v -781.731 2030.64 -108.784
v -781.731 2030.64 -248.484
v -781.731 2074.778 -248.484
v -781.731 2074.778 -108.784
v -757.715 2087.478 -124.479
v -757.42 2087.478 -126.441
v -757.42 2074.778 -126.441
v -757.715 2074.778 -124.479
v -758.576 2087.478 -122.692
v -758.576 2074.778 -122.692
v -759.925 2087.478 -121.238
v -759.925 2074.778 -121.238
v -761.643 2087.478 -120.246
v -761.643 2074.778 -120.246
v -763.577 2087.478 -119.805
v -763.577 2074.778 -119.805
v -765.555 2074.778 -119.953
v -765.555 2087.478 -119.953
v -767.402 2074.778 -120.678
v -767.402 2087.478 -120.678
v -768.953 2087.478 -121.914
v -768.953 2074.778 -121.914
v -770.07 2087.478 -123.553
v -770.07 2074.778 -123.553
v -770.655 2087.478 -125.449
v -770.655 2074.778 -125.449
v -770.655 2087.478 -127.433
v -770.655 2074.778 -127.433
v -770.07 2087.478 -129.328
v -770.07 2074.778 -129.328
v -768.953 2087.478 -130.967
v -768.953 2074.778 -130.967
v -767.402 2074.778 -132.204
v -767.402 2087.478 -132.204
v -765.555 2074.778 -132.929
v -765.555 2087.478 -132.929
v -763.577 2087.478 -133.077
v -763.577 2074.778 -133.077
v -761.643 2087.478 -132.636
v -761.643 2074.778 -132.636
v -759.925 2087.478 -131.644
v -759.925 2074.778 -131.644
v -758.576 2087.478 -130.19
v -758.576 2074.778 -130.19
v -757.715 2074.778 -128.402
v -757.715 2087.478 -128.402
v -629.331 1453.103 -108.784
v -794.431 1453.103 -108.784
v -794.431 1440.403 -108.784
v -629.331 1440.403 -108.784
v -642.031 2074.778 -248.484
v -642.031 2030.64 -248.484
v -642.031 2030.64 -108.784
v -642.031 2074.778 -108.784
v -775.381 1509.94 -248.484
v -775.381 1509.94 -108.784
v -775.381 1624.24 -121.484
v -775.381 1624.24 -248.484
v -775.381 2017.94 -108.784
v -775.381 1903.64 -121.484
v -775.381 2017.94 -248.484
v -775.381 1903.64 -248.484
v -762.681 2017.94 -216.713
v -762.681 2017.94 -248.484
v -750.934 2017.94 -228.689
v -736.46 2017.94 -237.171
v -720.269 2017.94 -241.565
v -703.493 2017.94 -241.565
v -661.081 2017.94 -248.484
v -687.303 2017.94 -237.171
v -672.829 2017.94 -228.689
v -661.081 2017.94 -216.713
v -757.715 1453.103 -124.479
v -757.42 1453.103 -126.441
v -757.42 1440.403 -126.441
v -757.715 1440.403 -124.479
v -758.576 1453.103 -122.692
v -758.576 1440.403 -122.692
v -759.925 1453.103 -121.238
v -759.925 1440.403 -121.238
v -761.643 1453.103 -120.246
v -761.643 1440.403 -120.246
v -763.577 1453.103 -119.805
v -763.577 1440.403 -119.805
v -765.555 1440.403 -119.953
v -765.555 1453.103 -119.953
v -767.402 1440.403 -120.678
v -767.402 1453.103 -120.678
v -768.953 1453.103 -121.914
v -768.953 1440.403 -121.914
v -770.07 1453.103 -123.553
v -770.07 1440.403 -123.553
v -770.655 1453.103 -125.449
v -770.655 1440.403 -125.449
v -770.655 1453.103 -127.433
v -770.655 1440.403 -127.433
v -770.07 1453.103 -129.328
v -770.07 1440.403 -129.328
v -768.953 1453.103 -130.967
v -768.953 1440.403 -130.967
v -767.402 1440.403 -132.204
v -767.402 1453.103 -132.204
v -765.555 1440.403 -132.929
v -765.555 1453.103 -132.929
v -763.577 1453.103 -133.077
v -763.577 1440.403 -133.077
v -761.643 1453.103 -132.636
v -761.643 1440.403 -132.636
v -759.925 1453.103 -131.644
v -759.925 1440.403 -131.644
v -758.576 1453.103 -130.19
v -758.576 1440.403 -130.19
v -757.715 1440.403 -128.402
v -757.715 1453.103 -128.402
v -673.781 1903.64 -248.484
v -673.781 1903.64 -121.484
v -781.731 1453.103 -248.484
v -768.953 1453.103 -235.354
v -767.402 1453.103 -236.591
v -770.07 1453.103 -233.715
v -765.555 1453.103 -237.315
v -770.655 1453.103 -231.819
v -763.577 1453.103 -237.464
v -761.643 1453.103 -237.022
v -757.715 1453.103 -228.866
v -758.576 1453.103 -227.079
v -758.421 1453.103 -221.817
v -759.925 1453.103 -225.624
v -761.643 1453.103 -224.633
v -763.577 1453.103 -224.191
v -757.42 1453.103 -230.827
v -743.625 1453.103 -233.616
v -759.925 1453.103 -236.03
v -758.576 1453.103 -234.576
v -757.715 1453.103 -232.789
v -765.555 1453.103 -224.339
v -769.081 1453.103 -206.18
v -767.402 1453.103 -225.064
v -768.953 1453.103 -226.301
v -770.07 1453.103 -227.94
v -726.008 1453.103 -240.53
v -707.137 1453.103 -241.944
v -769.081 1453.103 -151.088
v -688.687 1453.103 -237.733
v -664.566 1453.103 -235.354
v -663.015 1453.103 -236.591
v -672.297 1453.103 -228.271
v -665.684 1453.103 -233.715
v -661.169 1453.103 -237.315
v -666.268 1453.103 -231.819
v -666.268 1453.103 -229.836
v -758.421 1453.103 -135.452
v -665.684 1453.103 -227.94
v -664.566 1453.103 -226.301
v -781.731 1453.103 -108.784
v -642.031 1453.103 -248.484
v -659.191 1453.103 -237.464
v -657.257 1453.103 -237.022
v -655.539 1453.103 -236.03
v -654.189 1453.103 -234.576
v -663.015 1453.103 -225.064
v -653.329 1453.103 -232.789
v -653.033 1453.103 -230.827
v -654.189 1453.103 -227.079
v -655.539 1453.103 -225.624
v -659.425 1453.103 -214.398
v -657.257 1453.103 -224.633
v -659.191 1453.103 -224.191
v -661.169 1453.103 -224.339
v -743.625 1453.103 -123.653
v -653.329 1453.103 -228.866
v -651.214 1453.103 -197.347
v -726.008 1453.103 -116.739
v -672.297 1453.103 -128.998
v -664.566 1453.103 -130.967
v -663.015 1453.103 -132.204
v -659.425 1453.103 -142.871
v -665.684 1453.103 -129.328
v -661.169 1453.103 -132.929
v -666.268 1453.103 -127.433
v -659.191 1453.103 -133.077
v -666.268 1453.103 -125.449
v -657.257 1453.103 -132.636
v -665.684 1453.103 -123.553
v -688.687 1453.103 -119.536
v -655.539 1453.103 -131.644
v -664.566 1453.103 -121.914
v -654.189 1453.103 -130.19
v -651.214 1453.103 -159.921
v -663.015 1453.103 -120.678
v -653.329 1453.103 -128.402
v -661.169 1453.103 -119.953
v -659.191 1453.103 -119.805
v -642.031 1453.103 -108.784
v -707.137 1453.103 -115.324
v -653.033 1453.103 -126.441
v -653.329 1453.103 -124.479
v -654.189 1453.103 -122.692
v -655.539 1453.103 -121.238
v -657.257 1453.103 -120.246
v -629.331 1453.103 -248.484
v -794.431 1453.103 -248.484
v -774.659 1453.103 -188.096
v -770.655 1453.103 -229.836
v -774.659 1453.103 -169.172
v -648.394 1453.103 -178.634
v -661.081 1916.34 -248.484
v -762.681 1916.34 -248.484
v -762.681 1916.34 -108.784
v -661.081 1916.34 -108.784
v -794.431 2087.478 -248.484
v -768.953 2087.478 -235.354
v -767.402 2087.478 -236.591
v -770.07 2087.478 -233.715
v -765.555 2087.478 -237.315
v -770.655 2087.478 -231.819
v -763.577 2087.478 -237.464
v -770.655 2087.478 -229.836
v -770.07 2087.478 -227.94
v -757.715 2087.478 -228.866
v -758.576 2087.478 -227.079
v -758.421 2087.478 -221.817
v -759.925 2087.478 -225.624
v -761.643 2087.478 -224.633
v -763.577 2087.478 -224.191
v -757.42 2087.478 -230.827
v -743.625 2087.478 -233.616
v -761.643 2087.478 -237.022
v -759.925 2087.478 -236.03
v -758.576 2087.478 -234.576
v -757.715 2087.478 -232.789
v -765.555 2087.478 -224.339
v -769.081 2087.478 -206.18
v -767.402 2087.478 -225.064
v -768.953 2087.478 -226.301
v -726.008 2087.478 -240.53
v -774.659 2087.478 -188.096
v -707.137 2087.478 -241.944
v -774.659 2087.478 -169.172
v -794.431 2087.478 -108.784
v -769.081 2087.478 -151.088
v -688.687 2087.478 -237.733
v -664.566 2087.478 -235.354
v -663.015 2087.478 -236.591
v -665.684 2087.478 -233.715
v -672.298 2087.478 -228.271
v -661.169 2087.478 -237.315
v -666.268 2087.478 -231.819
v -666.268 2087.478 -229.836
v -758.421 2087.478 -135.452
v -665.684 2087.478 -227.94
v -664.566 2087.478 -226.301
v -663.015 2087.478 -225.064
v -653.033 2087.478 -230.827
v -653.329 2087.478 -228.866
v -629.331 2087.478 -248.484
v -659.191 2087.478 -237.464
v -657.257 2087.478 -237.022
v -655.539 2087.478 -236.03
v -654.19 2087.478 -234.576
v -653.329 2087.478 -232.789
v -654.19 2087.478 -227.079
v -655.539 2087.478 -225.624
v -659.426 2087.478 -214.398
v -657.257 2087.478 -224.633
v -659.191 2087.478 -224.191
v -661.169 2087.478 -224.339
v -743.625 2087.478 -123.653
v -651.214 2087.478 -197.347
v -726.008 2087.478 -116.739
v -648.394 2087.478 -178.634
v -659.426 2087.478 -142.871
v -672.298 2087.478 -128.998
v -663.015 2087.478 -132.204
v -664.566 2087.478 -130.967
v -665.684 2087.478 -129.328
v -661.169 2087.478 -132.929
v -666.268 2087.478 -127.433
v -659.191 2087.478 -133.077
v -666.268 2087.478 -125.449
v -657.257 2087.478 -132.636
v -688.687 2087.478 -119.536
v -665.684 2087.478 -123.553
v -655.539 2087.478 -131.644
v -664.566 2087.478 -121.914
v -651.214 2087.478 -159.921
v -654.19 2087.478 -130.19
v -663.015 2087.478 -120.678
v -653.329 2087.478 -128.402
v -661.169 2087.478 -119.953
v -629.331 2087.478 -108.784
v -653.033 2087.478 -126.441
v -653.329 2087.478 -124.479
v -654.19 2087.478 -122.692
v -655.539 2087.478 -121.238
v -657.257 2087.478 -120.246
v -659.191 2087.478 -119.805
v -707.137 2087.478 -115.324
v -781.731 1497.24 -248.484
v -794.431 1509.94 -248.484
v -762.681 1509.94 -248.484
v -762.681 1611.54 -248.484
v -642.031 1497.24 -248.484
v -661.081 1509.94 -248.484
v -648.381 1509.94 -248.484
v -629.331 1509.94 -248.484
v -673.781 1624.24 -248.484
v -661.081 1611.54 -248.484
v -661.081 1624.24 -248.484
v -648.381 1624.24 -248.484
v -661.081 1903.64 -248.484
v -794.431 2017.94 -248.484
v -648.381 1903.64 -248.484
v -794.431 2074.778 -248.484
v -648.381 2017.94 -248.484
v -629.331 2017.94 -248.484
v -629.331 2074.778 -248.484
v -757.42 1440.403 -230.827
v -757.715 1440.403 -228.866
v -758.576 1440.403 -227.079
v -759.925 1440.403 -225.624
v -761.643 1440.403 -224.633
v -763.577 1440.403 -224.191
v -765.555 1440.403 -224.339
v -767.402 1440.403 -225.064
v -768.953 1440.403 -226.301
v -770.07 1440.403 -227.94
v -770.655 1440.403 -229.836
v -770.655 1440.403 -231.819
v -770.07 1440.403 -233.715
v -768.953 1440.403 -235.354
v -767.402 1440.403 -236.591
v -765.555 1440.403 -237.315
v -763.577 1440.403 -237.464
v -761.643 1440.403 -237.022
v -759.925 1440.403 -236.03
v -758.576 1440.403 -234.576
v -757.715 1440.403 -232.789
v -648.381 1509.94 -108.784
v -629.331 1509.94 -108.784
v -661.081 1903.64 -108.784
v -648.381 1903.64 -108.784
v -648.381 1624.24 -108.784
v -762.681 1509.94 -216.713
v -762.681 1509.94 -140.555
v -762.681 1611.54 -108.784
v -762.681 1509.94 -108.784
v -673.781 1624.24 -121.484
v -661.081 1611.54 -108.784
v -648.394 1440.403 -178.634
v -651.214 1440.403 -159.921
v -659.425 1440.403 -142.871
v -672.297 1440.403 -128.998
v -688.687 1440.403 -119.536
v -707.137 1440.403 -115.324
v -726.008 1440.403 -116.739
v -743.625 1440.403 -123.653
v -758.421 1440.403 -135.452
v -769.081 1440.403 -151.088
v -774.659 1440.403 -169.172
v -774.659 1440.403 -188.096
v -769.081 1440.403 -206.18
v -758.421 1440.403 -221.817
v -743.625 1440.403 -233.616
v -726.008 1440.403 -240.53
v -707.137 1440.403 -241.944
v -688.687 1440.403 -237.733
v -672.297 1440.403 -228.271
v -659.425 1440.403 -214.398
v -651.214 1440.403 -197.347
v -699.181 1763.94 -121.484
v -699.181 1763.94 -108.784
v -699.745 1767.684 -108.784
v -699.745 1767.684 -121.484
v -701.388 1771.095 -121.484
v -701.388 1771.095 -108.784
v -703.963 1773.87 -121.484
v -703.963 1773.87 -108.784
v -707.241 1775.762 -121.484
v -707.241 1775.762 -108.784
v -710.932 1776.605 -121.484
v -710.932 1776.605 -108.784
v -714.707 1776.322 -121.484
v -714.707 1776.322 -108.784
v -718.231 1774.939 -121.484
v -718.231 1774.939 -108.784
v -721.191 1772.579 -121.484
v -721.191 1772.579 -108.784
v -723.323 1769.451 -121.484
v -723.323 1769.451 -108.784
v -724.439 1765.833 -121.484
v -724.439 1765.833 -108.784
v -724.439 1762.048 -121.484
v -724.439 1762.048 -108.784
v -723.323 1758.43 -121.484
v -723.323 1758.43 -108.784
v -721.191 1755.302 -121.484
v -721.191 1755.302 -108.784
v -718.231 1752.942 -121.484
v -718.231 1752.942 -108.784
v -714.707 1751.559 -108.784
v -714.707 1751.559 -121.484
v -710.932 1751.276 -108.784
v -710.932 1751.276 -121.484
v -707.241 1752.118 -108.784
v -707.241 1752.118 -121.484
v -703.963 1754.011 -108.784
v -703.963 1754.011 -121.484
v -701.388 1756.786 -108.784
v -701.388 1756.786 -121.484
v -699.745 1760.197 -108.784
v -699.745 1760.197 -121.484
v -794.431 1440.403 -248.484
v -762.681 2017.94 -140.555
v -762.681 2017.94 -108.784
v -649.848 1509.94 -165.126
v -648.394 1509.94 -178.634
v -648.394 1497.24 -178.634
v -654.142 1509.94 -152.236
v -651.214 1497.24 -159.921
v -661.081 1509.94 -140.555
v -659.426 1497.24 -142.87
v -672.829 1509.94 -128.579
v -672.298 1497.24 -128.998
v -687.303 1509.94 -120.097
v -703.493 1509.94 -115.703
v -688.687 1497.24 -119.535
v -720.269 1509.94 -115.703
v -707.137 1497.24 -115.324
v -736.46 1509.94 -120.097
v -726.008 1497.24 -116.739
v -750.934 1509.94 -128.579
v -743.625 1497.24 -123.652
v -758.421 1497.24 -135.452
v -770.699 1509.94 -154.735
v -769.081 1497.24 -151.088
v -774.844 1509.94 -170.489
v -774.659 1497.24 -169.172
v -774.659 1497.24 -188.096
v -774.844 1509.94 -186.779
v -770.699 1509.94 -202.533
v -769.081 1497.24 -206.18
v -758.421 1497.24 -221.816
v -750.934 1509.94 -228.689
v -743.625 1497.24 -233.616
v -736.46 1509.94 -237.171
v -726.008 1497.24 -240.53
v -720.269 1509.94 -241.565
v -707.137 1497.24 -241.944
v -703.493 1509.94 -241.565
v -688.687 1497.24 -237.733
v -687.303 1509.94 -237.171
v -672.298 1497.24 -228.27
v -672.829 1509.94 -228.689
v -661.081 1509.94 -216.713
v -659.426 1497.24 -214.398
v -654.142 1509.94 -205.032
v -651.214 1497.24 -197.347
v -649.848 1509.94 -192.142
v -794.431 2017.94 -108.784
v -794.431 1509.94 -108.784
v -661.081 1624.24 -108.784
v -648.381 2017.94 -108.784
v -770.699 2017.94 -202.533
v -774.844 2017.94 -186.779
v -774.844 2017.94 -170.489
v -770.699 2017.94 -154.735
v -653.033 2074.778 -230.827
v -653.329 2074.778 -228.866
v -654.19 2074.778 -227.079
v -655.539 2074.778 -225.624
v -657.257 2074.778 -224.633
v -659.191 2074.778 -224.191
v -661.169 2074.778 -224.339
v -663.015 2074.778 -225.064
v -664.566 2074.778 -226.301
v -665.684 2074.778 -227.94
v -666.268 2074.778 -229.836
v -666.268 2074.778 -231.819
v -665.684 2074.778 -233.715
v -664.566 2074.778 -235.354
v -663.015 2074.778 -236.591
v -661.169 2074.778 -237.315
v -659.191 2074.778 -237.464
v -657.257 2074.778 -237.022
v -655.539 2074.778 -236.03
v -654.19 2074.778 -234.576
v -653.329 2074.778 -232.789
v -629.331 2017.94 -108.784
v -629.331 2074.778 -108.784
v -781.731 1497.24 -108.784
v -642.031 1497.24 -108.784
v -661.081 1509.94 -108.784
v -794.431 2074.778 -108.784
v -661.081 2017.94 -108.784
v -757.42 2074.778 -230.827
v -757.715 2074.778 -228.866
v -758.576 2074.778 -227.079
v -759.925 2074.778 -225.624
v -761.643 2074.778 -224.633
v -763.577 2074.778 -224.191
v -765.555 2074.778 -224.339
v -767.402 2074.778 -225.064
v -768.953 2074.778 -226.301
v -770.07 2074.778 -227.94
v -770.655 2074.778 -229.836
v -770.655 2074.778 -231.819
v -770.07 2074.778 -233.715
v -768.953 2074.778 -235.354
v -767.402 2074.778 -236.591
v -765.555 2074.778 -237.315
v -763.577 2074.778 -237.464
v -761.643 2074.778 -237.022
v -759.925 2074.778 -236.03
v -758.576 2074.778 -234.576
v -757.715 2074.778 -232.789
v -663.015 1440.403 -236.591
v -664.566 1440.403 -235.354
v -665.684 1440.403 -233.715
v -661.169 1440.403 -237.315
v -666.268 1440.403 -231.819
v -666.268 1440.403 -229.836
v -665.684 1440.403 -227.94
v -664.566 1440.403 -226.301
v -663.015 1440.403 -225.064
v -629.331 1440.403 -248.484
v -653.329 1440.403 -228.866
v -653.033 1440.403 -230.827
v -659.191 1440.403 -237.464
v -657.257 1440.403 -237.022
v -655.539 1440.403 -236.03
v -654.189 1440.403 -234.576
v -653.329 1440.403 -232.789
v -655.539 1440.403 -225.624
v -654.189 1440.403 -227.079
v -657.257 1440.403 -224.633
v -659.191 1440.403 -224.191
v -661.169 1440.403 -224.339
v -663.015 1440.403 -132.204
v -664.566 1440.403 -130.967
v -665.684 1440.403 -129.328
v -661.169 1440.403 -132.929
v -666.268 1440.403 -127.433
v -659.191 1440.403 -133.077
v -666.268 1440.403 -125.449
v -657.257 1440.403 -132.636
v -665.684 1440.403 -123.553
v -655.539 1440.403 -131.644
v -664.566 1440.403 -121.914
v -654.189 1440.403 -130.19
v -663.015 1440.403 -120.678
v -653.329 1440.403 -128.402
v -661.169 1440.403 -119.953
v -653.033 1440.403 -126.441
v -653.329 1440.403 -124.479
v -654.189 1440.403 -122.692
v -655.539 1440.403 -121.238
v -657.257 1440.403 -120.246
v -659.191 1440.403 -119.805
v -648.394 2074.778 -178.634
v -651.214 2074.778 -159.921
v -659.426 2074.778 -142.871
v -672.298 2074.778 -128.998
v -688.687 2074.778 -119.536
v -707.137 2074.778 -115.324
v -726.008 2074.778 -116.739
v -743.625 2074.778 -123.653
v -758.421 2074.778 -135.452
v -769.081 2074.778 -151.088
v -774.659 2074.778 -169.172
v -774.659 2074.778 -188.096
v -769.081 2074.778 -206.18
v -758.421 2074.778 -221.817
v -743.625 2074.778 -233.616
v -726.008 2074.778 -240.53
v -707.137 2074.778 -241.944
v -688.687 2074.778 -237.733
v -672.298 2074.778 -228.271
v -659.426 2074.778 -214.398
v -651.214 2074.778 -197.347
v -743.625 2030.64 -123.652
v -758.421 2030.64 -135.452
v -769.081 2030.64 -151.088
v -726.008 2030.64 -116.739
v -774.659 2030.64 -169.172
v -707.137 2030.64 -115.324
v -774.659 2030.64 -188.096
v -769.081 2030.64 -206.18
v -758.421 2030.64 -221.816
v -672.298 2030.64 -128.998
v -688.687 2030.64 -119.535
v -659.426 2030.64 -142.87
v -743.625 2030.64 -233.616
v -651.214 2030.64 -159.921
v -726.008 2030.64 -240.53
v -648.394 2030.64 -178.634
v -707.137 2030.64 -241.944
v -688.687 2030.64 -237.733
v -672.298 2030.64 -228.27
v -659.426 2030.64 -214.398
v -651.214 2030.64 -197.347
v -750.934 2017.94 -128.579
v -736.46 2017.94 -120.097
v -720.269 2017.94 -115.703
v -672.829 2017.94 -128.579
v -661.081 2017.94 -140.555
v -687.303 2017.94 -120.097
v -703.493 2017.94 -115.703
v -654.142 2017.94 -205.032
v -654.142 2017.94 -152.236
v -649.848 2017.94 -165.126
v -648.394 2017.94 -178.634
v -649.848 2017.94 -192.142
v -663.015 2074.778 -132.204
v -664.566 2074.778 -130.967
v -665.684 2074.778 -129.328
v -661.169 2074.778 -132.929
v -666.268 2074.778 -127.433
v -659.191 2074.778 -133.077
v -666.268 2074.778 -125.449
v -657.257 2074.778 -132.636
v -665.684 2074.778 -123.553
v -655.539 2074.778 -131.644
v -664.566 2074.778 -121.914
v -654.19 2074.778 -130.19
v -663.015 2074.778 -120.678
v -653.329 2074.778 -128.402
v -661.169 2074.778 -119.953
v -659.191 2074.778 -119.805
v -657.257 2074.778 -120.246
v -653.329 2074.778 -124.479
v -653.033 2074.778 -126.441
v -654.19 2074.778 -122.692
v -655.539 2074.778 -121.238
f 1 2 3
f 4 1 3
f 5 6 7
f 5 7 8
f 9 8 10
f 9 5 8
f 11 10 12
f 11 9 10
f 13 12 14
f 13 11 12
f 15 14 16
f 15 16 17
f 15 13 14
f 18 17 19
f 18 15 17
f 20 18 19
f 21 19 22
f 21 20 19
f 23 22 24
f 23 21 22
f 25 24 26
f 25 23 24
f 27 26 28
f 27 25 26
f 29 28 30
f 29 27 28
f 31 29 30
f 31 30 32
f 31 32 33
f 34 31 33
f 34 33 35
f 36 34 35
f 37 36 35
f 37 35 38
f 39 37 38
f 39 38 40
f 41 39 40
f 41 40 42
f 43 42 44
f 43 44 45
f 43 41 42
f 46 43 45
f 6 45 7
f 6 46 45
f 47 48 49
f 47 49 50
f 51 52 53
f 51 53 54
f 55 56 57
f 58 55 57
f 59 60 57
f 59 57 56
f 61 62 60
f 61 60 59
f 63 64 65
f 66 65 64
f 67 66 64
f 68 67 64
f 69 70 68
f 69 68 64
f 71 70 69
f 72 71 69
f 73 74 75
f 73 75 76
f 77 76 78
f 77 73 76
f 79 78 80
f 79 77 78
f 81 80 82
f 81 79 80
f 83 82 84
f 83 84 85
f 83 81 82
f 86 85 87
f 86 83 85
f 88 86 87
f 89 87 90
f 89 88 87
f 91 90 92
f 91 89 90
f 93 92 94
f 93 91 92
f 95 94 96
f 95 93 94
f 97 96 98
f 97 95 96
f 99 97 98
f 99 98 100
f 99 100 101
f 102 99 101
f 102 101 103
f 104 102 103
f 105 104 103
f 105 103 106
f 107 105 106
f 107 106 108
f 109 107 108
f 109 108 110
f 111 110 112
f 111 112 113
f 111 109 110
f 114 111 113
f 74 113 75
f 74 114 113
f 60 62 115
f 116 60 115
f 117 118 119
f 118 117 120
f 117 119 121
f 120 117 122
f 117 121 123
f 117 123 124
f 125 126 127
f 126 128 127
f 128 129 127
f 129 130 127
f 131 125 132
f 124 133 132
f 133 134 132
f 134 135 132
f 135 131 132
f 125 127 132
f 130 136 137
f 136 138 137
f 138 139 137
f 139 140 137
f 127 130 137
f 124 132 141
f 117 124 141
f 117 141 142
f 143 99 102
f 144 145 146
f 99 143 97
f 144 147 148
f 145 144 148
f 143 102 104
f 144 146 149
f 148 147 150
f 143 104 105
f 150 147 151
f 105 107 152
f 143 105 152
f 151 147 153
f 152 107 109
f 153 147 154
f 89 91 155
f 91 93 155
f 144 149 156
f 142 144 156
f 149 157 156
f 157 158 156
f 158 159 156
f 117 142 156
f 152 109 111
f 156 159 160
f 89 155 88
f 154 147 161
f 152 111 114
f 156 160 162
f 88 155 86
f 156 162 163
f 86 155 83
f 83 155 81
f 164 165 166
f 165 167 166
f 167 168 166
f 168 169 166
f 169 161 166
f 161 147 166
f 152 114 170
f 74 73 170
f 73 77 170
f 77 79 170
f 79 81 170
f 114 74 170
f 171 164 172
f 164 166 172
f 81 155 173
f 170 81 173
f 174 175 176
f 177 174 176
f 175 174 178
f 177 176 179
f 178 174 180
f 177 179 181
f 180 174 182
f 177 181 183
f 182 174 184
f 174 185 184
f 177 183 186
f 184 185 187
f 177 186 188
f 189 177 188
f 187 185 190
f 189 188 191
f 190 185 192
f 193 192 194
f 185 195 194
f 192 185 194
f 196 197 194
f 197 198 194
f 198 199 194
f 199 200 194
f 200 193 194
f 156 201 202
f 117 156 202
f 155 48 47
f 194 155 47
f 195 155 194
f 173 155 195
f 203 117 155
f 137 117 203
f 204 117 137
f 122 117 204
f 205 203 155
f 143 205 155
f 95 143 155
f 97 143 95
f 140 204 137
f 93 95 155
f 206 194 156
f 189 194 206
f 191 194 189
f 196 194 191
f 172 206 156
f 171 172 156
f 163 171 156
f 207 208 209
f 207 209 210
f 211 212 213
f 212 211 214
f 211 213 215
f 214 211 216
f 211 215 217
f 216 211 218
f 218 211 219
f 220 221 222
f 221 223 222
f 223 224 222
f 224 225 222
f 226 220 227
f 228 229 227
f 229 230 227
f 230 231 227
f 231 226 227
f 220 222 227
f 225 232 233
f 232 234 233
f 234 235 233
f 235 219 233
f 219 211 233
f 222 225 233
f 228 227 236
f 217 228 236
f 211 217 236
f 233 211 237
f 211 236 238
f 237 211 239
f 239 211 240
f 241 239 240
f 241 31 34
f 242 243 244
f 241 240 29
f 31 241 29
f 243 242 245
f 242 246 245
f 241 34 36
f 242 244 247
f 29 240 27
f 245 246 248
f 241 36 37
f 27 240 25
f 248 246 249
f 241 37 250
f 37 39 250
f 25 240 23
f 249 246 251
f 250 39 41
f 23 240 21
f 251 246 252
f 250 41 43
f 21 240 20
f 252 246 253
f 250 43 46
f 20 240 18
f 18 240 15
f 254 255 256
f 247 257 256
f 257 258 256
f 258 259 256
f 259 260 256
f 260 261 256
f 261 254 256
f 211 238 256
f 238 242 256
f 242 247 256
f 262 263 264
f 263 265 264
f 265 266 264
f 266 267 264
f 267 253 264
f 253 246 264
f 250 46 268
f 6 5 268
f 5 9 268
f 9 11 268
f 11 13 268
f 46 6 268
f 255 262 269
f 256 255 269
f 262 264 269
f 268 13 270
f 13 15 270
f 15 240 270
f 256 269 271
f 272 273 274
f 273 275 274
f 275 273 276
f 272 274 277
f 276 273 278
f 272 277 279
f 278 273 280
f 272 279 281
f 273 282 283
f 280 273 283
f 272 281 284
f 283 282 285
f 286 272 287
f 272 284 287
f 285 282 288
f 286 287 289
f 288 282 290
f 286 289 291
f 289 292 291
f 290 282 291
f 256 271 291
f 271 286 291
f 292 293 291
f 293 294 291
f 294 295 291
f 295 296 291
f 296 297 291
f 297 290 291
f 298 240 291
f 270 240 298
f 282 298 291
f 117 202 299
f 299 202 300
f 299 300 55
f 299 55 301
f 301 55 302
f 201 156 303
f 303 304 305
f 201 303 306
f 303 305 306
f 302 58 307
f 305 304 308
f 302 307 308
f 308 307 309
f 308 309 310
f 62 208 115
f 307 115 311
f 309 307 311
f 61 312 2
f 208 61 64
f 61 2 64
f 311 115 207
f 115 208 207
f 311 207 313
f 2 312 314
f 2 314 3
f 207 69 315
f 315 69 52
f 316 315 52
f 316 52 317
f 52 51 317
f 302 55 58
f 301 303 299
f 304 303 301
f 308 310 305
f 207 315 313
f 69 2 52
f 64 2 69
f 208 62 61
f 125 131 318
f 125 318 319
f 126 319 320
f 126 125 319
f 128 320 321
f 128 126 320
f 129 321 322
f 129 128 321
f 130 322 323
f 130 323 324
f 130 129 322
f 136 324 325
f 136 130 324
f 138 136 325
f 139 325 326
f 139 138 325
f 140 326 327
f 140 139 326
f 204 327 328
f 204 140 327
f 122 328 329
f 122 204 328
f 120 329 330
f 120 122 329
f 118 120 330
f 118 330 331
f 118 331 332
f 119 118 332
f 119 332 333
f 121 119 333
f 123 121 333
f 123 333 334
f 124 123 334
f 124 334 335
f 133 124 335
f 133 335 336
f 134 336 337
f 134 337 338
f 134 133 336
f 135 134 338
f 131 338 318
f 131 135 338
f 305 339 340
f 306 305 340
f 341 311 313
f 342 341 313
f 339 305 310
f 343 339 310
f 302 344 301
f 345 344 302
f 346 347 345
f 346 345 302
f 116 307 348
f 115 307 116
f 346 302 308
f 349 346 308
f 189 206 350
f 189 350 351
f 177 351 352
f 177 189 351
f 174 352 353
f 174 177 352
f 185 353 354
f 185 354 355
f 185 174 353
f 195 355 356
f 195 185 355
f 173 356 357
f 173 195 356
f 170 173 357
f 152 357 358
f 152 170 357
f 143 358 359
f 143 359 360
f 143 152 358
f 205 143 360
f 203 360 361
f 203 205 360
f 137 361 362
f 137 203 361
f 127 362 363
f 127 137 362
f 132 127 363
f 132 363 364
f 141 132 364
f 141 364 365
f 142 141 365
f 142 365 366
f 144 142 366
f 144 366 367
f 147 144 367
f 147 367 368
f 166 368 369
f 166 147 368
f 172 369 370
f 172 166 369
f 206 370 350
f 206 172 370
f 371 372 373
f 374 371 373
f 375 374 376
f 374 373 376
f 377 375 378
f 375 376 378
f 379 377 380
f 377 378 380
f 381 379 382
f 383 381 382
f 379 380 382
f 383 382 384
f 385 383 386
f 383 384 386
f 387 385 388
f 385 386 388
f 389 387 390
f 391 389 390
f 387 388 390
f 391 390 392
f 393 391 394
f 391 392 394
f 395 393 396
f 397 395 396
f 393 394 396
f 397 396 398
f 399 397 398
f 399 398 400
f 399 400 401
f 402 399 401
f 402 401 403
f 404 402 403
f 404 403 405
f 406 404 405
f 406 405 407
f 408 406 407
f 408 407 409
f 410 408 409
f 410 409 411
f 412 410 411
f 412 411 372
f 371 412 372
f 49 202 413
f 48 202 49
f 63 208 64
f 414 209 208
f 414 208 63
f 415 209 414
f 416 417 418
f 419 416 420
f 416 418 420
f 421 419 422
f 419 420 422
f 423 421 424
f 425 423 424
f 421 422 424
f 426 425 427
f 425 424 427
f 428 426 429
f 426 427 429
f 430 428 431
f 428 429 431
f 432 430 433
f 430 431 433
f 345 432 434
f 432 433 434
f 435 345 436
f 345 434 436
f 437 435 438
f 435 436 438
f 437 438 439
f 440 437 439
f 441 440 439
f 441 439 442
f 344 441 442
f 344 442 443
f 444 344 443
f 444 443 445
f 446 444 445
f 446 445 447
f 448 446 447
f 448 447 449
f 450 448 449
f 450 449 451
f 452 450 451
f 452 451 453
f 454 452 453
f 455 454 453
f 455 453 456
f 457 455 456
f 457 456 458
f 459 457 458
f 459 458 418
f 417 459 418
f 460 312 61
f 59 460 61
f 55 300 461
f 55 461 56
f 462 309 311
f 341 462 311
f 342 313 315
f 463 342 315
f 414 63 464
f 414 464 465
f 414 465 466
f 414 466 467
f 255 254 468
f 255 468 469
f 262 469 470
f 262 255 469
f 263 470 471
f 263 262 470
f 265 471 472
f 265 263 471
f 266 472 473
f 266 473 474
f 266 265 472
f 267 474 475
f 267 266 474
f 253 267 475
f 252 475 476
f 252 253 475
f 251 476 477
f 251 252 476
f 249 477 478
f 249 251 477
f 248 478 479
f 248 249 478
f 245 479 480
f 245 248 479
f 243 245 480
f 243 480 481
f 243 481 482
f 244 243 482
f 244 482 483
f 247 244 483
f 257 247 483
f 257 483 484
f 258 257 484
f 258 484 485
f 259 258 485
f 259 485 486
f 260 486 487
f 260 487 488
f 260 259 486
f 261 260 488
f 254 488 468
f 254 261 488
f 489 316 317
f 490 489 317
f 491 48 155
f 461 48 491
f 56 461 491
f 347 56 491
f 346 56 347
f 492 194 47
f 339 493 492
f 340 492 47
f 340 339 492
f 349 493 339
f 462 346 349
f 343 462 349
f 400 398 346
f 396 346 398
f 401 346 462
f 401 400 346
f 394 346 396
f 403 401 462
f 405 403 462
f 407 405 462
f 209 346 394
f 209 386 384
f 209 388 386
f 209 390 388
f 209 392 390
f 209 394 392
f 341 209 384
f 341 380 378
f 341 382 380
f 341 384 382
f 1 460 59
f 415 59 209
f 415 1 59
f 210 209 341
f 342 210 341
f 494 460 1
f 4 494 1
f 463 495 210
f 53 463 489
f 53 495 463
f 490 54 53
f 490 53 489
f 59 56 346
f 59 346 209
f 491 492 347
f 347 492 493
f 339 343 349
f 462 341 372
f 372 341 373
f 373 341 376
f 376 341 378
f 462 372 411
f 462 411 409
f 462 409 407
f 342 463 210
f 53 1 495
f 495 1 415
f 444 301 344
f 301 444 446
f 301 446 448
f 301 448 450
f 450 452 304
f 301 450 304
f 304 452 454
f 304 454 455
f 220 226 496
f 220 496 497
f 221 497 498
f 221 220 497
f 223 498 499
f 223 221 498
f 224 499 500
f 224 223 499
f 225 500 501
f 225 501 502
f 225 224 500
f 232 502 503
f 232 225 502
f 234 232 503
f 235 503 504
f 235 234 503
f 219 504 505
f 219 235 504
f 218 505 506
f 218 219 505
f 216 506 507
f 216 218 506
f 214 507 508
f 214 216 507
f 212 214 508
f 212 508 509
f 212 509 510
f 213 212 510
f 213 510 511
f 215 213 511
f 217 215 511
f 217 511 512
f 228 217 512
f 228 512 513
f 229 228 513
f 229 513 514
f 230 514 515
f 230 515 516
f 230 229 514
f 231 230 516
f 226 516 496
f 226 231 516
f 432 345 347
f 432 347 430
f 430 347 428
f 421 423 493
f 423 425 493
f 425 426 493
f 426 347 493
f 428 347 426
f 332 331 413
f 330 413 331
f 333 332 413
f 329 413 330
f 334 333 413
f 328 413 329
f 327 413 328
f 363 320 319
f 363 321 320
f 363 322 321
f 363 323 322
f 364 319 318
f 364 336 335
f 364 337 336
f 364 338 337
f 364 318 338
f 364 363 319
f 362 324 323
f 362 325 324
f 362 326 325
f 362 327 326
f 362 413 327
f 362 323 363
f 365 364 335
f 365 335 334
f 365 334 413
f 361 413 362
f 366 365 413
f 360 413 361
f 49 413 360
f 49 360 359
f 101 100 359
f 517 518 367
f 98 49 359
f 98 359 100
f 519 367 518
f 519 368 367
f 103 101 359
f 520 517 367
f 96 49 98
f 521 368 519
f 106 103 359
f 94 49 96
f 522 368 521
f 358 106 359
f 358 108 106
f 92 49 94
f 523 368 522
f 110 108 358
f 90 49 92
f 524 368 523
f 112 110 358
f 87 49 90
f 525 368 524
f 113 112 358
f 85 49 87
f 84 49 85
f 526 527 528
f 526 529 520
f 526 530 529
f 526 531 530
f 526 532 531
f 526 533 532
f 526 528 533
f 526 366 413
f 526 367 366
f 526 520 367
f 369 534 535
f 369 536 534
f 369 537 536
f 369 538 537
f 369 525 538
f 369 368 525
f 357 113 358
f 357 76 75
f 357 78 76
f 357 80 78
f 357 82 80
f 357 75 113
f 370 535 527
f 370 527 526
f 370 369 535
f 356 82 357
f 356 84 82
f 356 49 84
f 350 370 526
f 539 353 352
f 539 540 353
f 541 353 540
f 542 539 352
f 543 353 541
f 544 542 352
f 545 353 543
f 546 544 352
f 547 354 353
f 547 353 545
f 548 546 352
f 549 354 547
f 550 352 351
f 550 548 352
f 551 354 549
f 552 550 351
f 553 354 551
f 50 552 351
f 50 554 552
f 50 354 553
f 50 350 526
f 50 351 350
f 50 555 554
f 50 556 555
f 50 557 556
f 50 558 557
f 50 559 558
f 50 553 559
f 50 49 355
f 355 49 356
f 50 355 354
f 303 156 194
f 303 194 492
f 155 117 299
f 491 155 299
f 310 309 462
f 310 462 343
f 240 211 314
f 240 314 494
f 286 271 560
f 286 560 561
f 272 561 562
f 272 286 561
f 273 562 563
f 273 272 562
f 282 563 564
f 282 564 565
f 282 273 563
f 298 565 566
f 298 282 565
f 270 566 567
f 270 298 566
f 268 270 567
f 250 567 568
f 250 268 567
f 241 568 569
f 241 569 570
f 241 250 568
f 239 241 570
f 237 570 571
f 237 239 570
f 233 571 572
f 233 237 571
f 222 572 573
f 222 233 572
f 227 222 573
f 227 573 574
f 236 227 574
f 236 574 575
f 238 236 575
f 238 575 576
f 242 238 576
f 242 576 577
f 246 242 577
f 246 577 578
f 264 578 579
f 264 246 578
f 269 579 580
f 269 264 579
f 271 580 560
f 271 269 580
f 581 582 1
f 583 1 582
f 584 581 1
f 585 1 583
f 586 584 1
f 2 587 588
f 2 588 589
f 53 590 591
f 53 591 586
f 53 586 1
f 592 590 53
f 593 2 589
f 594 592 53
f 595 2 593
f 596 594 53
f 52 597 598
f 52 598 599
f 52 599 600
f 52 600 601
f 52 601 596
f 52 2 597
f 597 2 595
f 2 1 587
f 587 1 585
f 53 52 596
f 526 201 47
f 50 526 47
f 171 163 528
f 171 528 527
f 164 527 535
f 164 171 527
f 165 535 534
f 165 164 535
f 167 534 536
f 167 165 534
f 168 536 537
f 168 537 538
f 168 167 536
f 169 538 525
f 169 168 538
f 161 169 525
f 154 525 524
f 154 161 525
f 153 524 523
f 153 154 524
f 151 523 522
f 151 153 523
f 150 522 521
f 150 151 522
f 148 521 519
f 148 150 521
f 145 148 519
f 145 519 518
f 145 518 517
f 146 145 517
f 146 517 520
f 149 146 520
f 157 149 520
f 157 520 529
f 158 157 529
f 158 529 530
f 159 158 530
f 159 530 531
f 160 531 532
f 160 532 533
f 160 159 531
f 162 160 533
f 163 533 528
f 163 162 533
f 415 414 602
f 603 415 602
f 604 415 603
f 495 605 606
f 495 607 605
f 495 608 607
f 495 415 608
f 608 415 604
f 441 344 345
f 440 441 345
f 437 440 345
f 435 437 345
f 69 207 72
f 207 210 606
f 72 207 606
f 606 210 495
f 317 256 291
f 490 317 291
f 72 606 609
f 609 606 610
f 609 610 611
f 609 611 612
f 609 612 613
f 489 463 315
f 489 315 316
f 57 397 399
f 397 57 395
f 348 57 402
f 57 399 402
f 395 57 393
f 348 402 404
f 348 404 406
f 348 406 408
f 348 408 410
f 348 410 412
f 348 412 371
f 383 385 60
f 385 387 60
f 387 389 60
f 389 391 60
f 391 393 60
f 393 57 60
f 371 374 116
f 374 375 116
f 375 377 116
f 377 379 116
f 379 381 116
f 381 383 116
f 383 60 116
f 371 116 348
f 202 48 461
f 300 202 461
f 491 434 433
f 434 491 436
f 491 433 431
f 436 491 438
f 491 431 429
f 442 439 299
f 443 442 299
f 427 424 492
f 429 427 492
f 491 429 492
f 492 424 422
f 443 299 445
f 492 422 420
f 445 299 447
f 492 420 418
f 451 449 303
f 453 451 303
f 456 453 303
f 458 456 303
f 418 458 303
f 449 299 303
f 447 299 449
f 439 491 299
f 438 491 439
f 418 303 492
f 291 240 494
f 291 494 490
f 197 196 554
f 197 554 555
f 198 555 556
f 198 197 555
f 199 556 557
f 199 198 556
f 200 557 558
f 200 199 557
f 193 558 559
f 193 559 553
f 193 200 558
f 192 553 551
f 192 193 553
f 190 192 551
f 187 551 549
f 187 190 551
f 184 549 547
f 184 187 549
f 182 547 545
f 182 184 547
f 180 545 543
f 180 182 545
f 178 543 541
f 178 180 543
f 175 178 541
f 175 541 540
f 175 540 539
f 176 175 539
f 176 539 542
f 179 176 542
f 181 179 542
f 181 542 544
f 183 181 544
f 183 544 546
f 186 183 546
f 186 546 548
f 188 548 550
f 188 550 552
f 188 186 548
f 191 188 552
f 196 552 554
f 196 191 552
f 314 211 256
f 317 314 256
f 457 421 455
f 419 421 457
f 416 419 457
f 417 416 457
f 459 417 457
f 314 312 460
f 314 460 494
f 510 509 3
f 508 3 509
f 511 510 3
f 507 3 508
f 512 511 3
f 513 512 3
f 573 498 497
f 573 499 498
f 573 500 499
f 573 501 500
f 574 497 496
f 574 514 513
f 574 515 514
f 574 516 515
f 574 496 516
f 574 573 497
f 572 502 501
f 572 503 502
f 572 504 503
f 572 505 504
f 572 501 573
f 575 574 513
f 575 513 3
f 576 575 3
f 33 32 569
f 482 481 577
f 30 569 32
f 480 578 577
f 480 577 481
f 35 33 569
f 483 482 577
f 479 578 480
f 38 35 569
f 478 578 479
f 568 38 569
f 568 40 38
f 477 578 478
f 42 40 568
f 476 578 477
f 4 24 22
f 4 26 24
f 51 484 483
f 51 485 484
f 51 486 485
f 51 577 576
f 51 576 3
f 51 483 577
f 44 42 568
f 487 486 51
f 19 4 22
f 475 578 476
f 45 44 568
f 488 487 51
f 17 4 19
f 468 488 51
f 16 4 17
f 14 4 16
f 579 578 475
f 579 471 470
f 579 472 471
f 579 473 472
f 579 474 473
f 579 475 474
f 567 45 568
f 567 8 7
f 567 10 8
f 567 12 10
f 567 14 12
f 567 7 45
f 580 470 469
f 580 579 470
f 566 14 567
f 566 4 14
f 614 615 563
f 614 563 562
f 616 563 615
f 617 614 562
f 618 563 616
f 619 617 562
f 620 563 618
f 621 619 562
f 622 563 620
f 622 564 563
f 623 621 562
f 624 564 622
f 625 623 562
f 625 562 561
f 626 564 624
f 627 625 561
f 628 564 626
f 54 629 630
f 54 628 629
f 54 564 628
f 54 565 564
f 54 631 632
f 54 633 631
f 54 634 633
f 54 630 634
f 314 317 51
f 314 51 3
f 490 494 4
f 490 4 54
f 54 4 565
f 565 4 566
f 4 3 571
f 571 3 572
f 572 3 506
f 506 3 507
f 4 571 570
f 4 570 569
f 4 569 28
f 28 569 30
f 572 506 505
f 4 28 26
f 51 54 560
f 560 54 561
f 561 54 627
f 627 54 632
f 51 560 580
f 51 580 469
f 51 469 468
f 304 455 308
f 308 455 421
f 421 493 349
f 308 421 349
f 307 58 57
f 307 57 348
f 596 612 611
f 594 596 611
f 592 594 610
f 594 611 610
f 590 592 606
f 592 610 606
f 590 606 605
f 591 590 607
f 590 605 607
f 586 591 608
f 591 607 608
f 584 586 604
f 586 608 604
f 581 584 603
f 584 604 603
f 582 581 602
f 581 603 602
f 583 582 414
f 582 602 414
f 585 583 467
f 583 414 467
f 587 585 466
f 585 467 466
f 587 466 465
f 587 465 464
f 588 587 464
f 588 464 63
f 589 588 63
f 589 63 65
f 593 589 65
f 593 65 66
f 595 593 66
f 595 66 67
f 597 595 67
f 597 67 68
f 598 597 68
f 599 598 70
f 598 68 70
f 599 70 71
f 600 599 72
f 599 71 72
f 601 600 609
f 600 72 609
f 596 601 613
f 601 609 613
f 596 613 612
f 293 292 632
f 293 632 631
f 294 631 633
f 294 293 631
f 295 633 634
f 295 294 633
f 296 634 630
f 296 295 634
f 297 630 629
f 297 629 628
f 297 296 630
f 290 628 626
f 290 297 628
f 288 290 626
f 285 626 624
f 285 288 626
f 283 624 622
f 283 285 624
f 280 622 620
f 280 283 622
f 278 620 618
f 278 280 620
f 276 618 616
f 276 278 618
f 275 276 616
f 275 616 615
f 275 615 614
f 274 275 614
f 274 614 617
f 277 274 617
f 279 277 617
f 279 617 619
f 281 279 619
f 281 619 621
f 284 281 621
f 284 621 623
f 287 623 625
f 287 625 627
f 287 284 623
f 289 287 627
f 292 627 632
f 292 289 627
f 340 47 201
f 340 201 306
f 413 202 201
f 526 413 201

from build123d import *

# Parameters (mm, degrees)
BOX003_W                 = 101.6
BOX003_H                 = 279.4
BOX003_DEPTH             = 12.7
BOX009_W                 = 12.7
BOX009_H                 = 44.1376
BOX009_DEPTH             = 139.7
BOX006_W                 = 12.7
BOX006_H                 = 44.1376
BOX006_DEPTH             = 139.7
BOX007_W                 = 12.7
BOX007_H                 = 44.1376
BOX007_DEPTH             = 139.7
SKETCH002_W              = 165.100117
SKETCH002_H              = 139.700117
SKETCH002_R              = 6.6548
SKETCH002_R_2            = 63.4873
PAD_DEPTH                = 12.7
CLONE001_PLACEMENT_ANGLE = 180
CLONE_PLACEMENT_ANGLE    = 180
BOX010_W                 = 165.1
BOX010_H                 = 12.7
BOX010_DEPTH             = 139.7
SKETCH004_R              = 63.4873
POCKET_DEPTH             = 12.7
BOX008_W                 = 12.7
BOX008_H                 = 44.1376
BOX008_DEPTH             = 139.7
BOX_W                    = 127
BOX_H                    = 114.3
BOX_DEPTH                = 139.7
BOX002_W                 = 12.7
BOX002_H                 = 279.4
BOX002_DEPTH             = 139.7
SKETCH003_R              = 12.7
SKETCH003_W              = 101.6
SKETCH003_H              = 101.6
POCKET003005_DEPTH       = 139.7


with BuildPart() as cube003:
    # Box003 → Box003 (new body)
    with BuildSketch(Plane(origin=(-224.636743, 494.971814, 58.555664), x_dir=(1, 0, 0), z_dir=(0, 0, 1))):
        with Locations((50.8, 139.7)):
            Rectangle(BOX003_W, BOX003_H)
    extrude(amount=BOX003_DEPTH)


with BuildPart() as cube009:
    # Box009 → Box009 (new body)
    with BuildSketch(Plane(origin=(-91.286743, 901.371814, -68.444336), x_dir=(1, 0, 0), z_dir=(0, 0, 1))):
        with Locations((6.35, 22.0688)):
            Rectangle(BOX009_W, BOX009_H)
    extrude(amount=BOX009_DEPTH)


with BuildPart() as cube006:
    # Box006 → Box006 (new body)
    with BuildSketch(Plane(origin=(-243.686743, 323.834214, -68.444336), x_dir=(1, 0, 0), z_dir=(0, 0, 1))):
        with Locations((6.35, 22.0688)):
            Rectangle(BOX006_W, BOX006_H)
    extrude(amount=BOX006_DEPTH)


with BuildPart() as cube007:
    # Box007 → Box007 (new body)
    with BuildSketch(Plane(origin=(-243.686743, 901.371814, -68.444336), x_dir=(1, 0, 0), z_dir=(0, 0, 1))):
        with Locations((6.35, 22.0688)):
            Rectangle(BOX007_W, BOX007_H)
    extrude(amount=BOX007_DEPTH)


with BuildPart() as pad:
    # Sketch002 → Pad (new body)
    with BuildSketch(Plane(origin=(0, 37.338, 0), x_dir=(-1, 0, 0), z_dir=(0, 1, 0))):
        with Locations((-69.215058, 89.86448)):
            Rectangle(SKETCH002_W, SKETCH002_H)
        with Locations((-121.408307, 142.057728)):
            Circle(SKETCH002_R, mode=Mode.SUBTRACT)
        with Locations((-17.02181, 142.057728)):
            Circle(SKETCH002_R, mode=Mode.SUBTRACT)
        with Locations((-17.02181, 37.671231)):
            Circle(SKETCH002_R, mode=Mode.SUBTRACT)
        with Locations((-121.408307, 37.671231)):
            Circle(SKETCH002_R, mode=Mode.SUBTRACT)
        with Locations((-69.215, 89.864421)):
            Circle(SKETCH002_R_2, mode=Mode.SUBTRACT)
    extrude(amount=PAD_DEPTH)


with BuildPart() as clone_of_pad001:
    # Clone001 base: copy of Pad
    add(pad.part)


with BuildPart() as clone_of_pad001_1:
    # Clone001 placement: moved
    add(clone_of_pad001.part.moved(Location((-91.921743, 995.547414, -88.458874))).rotate(Axis((-91.921743, 995.547414, -88.458874), (0, 0, 1)), CLONE001_PLACEMENT_ANGLE))


with BuildPart() as clone_of_pad:
    # Clone base: copy of Pad
    add(pad.part)


with BuildPart() as clone_of_pad_1:
    # Clone placement: moved
    add(clone_of_pad.part.moved(Location((-91.921626, 361.172214, -88.458874))).rotate(Axis((-91.921626, 361.172214, -88.458874), (0, 0, 1)), CLONE_PLACEMENT_ANGLE))


with BuildPart() as pocket:
    # Box010 → Box010 (new body)
    with BuildSketch(Plane(origin=(-102.435181, 88.203278, -436.376007), x_dir=(1, 0, 0), z_dir=(0, 0, 1))):
        with Locations((82.55, 6.35)):
            Rectangle(BOX010_W, BOX010_H)
    extrude(amount=BOX010_DEPTH)

    # Sketch004 → Pocket (cut)
    with BuildSketch(Plane(origin=(-102.435181, 88.203278, -436.376007), x_dir=(1, 0, 0), z_dir=(0, -1, 0))):
        with Locations((82.55, 69.85)):
            Circle(SKETCH004_R)
    extrude(amount=-POCKET_DEPTH, mode=Mode.SUBTRACT)


with BuildPart() as clone_of_pocket003005005:
    # Clone006 base: copy of Pocket
    add(pocket.part)


with BuildPart() as clone_of_pocket003005005_1:
    # Clone006 placement: moved
    add(clone_of_pocket003005005.part.moved(Location((-141.251562, 800.468536, 367.931671))))


with BuildPart() as clone_of_pocket:
    # Clone005 base: copy of Pocket
    add(pocket.part)


with BuildPart() as clone_of_pocket_1:
    # Clone005 placement: moved
    add(clone_of_pocket.part.moved(Location((-141.251562, 279.768536, 367.931671))))


with BuildPart() as cube008:
    # Box008 → Box008 (new body)
    with BuildSketch(Plane(origin=(-91.286743, 323.834214, -68.444336), x_dir=(1, 0, 0), z_dir=(0, 0, 1))):
        with Locations((6.35, 22.0688)):
            Rectangle(BOX008_W, BOX008_H)
    extrude(amount=BOX008_DEPTH)


with BuildPart() as cube:
    # Box → Box (new body)
    with BuildSketch(Plane(origin=(-224.636743, 380.671814, -68.444336), x_dir=(1, 0, 0), z_dir=(0, 0, 1))):
        with Locations((63.5, 57.15)):
            Rectangle(BOX_W, BOX_H)
    extrude(amount=BOX_DEPTH)


with BuildPart() as clone_of_cube:
    # Clone008 base: copy of Cube
    add(cube.part)


with BuildPart() as clone_of_cube_1:
    # Clone008 placement: moved
    add(clone_of_cube.part.moved(Location((0, 393.7, 0))))


with BuildPart() as pocket003005:
    # Box002 → Box002 (new body)
    with BuildSketch(Plane(origin=(-123.036743, 494.971814, -68.444336), x_dir=(1, 0, 0), z_dir=(0, 0, 1))):
        with Locations((6.35, 139.7)):
            Rectangle(BOX002_W, BOX002_H)
    extrude(amount=BOX002_DEPTH)

    # Fusion: union Cube003, Cube009, Cube006, Cube007, Clone of Pad001, Clone of Pad, Clone of Pocket003005005, Clone of Pocket, Cube008, Clone of Cube, Cube
    add(cube003.part)
    add(cube009.part)
    add(cube006.part)
    add(cube007.part)
    add(clone_of_pad001_1.part)
    add(clone_of_pad_1.part)
    add(clone_of_pocket003005005_1.part)
    add(clone_of_pocket_1.part)
    add(cube008.part)
    add(clone_of_cube_1.part)
    add(cube.part)


with BuildPart() as pocket003005_1:
    # Clone009 placement: moved
    add(pocket003005.part.moved(Location((-550.744446, 1129.268555, -180.039734))))

    # Sketch003 → Pocket003005 (cut)
    with BuildSketch(Plane(origin=(-550.744446, 1129.268555, -108.78407), x_dir=(1, 0, 0), z_dir=(0, 0, 1))):
        with Locations((-161.136743, 634.671814)):
            Circle(SKETCH003_R)
        with Locations((-161.136743, 837.871814)):
            Rectangle(SKETCH003_W, SKETCH003_H)
        with Locations((-161.136743, 431.471814)):
            Rectangle(SKETCH003_W, SKETCH003_H)
    extrude(amount=-POCKET003005_DEPTH, mode=Mode.SUBTRACT)


solid = pocket003005_1.part
